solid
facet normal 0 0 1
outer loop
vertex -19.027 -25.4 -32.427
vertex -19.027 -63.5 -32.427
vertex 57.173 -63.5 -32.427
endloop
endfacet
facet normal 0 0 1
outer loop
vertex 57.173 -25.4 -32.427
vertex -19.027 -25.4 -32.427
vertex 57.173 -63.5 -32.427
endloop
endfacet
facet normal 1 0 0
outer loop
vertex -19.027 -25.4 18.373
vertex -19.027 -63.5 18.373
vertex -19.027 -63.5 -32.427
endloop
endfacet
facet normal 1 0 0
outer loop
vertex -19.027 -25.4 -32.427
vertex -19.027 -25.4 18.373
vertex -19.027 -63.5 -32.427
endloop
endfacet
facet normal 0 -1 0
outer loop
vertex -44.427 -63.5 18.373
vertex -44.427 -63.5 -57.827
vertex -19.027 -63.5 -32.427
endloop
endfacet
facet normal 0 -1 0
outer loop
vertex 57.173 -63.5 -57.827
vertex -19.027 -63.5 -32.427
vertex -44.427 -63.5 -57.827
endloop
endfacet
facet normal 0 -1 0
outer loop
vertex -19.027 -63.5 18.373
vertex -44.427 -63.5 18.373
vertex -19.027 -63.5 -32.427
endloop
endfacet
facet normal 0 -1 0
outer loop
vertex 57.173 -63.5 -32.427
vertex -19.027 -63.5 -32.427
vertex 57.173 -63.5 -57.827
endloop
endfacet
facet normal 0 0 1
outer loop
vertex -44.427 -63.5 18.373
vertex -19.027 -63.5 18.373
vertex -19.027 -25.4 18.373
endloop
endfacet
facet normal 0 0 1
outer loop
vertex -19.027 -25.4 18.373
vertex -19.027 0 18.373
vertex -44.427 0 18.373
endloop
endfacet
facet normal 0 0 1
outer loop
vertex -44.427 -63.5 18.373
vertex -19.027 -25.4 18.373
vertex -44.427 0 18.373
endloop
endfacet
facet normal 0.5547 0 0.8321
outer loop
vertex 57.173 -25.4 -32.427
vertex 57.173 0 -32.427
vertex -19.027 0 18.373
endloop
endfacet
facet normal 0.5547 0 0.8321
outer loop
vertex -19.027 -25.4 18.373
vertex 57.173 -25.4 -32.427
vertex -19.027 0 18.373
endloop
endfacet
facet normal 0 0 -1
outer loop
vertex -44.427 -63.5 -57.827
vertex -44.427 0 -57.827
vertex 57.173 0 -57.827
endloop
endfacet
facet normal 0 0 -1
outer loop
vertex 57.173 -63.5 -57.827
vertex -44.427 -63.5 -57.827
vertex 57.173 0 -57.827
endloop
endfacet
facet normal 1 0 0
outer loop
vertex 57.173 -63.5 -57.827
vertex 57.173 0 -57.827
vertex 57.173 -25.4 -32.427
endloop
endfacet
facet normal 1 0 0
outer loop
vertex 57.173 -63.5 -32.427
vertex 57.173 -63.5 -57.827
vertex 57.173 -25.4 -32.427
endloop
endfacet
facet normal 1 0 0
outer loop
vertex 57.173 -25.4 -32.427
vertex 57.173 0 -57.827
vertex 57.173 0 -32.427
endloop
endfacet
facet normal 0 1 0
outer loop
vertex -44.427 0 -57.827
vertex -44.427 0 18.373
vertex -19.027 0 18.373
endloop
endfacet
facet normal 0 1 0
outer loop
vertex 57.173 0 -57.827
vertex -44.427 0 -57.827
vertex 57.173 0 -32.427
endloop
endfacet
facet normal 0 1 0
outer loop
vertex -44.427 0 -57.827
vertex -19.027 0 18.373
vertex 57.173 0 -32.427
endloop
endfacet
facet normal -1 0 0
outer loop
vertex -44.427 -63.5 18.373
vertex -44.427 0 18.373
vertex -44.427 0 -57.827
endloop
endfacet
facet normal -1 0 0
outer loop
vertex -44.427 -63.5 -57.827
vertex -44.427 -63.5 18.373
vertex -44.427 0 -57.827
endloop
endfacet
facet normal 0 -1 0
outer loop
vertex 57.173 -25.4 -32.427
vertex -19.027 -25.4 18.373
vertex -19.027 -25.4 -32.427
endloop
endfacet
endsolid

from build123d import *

# Parameters (mm, degrees)
F1_DEPTH = 63.5
F3_DEPTH = 38.1


with BuildPart() as f1:
    # F0 (on Front) → F1 (new body)
    with BuildSketch(Plane.XZ):
        Polygon((57.172726, -32.42728), (-19.027274, 18.37272), (-44.427274, 18.37272), (-44.427274, -57.82728), (57.172726, -57.82728), align=None)
    extrude(amount=F1_DEPTH)

    # F2 (on face) → F3 (cut)
    with BuildSketch(Plane.XZ.offset(63.5)):
        Polygon((-19.027274, 18.37272), (-19.027274, -32.42728), (57.172726, -32.42728), align=None)
    extrude(amount=-F3_DEPTH, mode=Mode.SUBTRACT)


solid = f1.part
